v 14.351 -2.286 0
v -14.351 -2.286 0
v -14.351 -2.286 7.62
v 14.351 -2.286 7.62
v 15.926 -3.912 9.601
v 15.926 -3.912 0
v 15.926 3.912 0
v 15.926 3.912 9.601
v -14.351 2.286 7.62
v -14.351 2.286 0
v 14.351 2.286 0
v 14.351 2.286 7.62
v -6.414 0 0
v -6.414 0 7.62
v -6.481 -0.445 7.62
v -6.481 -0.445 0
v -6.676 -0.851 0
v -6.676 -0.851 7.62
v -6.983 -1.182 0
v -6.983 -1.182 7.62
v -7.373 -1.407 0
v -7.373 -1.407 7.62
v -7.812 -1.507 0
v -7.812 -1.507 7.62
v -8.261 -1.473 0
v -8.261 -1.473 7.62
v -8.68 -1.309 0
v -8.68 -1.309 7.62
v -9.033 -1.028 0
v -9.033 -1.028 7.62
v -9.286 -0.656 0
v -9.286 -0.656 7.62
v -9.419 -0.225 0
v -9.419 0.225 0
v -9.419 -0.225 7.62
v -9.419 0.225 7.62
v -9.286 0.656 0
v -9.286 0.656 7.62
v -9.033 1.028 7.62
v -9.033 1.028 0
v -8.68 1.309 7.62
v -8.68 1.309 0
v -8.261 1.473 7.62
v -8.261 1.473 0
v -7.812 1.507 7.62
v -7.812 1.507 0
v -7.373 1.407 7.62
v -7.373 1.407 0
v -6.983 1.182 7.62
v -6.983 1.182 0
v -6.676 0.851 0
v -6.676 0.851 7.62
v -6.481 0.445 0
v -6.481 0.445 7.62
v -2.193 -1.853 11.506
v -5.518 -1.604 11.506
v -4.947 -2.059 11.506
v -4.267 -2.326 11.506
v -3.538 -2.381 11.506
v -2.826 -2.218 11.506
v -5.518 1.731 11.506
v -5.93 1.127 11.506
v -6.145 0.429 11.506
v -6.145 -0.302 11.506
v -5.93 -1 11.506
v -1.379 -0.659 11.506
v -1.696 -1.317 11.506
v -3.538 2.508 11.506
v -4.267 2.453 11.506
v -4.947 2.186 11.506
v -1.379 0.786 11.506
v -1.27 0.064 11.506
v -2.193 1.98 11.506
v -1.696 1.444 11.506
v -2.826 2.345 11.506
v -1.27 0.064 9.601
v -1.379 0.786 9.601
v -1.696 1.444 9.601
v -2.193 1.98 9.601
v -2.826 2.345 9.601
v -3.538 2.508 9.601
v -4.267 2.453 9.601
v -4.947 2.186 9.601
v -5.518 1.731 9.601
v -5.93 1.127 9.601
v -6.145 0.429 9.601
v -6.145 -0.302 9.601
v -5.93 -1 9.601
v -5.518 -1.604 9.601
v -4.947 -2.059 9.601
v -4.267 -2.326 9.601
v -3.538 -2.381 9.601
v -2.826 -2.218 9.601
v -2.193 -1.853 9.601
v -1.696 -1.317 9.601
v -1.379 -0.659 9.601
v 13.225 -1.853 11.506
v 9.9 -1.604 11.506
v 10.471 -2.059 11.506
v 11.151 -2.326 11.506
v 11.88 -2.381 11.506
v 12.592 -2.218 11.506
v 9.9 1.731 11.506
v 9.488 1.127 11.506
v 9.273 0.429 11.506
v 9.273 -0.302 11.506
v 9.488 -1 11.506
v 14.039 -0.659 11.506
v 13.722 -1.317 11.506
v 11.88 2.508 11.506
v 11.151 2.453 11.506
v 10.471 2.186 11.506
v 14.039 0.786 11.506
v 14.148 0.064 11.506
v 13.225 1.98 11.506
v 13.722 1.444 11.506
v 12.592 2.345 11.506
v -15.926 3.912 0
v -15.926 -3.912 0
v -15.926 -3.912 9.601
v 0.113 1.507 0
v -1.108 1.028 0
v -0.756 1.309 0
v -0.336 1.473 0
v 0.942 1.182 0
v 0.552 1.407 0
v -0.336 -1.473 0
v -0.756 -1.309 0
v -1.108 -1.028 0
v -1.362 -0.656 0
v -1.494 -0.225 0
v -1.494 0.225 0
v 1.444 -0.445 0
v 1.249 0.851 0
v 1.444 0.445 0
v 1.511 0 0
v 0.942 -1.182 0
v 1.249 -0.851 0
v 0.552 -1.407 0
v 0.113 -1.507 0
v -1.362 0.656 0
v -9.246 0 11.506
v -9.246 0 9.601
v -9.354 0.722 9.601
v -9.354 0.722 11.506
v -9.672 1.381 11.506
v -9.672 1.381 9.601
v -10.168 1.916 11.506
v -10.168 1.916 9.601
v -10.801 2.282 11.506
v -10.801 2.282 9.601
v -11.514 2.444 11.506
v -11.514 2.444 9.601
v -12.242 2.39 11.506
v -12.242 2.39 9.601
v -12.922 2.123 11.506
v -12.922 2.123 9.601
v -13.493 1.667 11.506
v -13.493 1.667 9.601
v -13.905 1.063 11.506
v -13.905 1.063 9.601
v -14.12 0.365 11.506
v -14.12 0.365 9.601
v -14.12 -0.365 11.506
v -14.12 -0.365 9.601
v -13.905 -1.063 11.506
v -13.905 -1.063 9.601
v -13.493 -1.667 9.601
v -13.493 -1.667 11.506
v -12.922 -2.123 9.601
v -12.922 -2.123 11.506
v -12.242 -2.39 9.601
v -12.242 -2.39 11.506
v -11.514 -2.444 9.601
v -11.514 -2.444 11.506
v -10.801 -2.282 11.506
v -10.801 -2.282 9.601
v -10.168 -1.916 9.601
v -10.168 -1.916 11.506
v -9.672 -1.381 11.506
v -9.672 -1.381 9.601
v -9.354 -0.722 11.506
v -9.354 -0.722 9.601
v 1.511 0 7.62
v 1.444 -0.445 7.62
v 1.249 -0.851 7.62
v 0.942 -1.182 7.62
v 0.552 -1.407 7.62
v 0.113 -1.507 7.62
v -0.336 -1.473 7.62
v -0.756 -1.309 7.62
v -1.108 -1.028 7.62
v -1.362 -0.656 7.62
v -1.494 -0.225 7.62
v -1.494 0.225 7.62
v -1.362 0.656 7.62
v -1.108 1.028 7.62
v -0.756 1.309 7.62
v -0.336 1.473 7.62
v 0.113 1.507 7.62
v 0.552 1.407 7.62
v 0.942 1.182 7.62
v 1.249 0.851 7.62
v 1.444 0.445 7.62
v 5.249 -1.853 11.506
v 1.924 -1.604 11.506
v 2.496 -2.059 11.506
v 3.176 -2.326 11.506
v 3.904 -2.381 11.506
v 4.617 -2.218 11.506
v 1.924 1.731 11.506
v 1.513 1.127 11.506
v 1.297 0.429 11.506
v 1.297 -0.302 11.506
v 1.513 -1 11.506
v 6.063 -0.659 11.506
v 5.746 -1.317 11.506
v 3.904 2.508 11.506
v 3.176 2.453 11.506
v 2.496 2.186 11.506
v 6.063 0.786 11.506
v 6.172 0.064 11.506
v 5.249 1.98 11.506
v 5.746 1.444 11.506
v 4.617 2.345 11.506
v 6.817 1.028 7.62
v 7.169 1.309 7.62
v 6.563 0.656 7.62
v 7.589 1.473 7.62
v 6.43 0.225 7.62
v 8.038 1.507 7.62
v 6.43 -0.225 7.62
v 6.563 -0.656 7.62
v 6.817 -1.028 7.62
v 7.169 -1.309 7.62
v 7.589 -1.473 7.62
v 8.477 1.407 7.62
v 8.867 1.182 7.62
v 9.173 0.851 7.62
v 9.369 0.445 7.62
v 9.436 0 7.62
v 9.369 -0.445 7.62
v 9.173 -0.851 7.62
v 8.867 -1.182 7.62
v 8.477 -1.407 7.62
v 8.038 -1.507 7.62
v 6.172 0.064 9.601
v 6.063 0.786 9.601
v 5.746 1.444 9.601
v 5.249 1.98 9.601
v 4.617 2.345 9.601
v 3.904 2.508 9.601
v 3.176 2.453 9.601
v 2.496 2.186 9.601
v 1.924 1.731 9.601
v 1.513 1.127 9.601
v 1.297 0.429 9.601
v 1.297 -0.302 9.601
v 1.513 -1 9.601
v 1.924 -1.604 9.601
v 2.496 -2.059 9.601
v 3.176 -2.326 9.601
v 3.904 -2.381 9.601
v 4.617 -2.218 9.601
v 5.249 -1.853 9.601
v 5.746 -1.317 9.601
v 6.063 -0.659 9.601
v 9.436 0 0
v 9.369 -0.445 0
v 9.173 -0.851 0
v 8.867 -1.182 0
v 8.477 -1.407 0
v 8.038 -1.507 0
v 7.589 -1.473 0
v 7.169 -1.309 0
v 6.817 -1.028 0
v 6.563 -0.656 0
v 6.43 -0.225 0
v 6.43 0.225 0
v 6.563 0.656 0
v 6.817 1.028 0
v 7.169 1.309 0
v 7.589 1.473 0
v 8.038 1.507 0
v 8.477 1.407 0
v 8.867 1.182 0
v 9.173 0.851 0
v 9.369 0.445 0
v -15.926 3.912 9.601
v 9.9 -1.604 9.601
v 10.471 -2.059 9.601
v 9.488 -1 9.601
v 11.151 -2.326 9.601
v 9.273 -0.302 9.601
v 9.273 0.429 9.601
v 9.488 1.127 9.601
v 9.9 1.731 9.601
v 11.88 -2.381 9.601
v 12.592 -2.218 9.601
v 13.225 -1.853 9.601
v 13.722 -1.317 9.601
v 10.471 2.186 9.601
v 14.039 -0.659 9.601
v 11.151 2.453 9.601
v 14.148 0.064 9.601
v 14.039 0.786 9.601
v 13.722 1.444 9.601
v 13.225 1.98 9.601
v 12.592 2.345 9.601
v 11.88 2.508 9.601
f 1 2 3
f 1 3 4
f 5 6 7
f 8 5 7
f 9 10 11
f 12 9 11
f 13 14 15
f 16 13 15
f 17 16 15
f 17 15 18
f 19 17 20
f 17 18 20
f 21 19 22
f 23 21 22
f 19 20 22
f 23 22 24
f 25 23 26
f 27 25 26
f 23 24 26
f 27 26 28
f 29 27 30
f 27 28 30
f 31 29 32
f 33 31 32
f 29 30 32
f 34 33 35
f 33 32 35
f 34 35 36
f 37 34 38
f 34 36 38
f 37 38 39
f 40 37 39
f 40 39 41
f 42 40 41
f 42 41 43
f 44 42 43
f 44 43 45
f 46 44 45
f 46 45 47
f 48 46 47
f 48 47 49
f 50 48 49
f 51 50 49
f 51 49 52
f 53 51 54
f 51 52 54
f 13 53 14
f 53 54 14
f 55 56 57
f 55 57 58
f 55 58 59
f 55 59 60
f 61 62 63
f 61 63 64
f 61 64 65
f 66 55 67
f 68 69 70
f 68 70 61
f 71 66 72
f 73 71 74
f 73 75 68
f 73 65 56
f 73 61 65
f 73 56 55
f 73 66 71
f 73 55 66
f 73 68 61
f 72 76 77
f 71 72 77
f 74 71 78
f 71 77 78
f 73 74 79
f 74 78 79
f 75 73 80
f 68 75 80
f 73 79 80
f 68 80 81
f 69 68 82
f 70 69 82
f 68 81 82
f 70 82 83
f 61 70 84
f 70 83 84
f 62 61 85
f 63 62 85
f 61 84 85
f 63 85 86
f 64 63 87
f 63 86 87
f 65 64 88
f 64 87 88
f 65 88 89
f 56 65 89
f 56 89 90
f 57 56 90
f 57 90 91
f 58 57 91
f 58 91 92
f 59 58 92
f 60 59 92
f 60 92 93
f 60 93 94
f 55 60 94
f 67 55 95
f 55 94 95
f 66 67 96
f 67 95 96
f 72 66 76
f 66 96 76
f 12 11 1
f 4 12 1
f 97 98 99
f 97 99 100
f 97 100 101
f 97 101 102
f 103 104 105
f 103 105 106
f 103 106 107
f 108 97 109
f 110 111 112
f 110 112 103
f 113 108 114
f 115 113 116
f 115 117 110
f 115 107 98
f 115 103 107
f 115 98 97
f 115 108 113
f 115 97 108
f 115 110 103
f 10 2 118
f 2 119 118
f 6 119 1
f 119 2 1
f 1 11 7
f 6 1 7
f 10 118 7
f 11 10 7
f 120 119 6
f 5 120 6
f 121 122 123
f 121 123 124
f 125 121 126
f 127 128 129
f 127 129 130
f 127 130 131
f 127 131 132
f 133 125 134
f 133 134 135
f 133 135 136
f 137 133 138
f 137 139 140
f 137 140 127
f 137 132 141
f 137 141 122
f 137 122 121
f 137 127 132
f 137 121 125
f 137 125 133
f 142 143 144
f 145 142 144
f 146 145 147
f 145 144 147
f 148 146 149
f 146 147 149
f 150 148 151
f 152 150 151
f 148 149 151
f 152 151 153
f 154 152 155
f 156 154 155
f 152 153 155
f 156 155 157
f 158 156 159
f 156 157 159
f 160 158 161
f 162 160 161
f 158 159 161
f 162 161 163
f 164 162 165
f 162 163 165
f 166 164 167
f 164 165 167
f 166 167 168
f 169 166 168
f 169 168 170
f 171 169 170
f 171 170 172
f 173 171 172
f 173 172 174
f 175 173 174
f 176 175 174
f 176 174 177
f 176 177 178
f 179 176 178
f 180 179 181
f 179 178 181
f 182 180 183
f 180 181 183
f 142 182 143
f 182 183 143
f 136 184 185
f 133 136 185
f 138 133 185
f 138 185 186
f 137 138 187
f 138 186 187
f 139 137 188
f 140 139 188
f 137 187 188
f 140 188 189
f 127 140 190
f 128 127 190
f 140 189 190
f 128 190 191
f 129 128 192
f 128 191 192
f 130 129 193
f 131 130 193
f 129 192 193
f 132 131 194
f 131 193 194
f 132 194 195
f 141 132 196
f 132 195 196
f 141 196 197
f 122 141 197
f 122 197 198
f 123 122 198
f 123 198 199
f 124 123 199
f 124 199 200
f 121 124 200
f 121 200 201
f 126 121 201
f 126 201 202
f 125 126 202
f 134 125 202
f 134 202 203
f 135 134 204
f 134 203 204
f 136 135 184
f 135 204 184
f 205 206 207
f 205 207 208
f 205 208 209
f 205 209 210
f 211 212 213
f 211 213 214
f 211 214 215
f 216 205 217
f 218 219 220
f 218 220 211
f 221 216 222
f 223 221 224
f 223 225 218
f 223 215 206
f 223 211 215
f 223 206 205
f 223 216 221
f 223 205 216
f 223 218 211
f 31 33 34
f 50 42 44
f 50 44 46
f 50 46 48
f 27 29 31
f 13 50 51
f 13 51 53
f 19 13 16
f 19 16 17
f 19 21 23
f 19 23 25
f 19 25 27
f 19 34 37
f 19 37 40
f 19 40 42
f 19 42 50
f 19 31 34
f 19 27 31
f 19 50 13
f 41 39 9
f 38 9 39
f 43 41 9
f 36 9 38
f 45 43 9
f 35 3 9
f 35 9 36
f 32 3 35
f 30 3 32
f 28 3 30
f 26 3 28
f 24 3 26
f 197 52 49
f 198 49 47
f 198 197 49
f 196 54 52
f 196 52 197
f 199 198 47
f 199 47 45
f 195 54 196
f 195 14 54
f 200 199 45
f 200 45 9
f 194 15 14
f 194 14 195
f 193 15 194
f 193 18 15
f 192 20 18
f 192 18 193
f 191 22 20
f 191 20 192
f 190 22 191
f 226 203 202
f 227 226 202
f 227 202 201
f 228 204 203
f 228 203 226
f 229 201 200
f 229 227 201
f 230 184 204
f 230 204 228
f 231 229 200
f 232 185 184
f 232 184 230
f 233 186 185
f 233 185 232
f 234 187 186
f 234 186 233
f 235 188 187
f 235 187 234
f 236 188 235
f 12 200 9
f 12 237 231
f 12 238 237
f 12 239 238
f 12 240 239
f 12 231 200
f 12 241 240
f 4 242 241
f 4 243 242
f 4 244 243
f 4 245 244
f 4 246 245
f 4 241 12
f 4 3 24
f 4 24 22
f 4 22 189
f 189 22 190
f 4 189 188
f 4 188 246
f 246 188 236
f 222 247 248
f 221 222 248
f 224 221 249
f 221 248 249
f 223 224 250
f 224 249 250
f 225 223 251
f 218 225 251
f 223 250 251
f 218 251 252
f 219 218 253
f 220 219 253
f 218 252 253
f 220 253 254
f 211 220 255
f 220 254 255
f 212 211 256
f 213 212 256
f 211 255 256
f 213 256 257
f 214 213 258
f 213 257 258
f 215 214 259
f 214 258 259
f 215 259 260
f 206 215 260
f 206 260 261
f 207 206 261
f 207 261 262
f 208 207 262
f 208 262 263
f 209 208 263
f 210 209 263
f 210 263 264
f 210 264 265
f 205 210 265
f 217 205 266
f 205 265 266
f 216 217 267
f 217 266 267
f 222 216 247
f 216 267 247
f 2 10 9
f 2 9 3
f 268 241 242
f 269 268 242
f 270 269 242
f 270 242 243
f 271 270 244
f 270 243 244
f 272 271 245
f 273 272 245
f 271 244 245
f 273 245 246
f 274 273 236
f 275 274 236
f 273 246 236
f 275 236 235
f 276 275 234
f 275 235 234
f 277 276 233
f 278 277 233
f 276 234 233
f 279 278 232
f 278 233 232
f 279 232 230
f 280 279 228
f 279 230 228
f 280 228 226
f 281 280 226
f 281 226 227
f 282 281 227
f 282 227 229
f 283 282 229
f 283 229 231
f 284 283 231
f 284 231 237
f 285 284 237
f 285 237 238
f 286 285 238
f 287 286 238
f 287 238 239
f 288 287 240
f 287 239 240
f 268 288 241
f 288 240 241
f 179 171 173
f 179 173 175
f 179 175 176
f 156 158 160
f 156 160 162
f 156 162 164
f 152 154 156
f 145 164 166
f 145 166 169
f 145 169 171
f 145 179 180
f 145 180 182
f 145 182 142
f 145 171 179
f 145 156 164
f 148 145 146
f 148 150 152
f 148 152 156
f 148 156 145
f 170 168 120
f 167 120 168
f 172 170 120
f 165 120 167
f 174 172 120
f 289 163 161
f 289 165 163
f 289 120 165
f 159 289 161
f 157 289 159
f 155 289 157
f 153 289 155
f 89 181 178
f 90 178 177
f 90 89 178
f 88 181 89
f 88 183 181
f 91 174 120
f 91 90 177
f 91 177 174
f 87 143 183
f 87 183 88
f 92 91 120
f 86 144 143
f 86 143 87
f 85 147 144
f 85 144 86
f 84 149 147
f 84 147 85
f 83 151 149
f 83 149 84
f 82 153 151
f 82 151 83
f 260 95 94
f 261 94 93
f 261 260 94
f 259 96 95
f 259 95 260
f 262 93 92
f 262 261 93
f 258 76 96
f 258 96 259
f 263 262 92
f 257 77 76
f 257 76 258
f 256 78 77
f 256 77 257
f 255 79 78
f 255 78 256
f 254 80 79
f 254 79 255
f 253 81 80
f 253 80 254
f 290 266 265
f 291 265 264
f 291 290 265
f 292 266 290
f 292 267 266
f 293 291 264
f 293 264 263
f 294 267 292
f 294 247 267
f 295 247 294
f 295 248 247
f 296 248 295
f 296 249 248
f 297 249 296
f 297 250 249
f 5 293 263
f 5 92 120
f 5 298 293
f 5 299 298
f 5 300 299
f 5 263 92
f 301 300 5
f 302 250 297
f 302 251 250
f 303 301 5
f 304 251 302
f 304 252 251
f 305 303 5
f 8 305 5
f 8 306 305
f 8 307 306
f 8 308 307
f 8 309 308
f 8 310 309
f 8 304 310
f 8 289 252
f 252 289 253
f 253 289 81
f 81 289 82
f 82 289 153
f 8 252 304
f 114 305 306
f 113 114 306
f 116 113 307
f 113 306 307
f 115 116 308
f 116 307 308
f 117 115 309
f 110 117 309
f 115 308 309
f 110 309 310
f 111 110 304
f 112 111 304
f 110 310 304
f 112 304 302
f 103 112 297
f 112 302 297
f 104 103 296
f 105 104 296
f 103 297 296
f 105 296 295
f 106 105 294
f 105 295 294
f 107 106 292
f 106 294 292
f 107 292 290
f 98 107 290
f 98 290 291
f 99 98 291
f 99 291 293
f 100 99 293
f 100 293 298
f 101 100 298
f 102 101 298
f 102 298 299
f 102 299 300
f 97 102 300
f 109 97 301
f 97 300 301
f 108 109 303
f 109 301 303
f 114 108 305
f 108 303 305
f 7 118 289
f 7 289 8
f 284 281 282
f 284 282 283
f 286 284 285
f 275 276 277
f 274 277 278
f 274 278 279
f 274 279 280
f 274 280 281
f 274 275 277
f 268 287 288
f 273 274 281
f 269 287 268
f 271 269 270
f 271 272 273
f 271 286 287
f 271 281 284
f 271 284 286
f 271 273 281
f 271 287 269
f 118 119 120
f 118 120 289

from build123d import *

# Parameters (mm, degrees)
F0_W      = 31.8516
F0_H      = 7.8232
F1_DEPTH  = 9.6012
F2_R      = 2.4511
F3_DEPTH  = 1.905
F4_R      = 2.4511
F5_DEPTH  = 1.905
F6_R      = 2.4511
F7_DEPTH  = 1.905
F8_W      = 28.702
F8_H      = 4.572
F9_DEPTH  = 7.62
F10_R     = 1.5113
F11_DEPTH = 7.62


with BuildPart() as f1:
    # F0 (on Top) → F1 (new body)
    with BuildSketch(Plane.XY):
        Rectangle(F0_W, F0_H)
    extrude(amount=F1_DEPTH)

    # F2 (on face) → F3 (join)
    with BuildSketch(Plane.XY.offset(9.6012)):
        with Locations((-11.6967, 0)):
            Circle(F2_R)
    extrude(amount=F3_DEPTH)

    # F4 (on face) → F5 (join)
    with BuildSketch(Plane.XY.offset(9.6012)):
        with Locations((11.6967, 0.0635)):
            Circle(F4_R)
    extrude(amount=F5_DEPTH)

    # F6 (on face) → F7 (join)
    with BuildSketch(Plane.XY.offset(9.6012)):
        with Locations((-3.721353, 0.0635)):
            Circle(F6_R)
        with Locations((3.7211, 0.0635)):
            Circle(F6_R)
    extrude(amount=F7_DEPTH)

    # F8 (on face) → F9 (cut)
    with BuildSketch(Plane(origin=(0, 0, 0), x_dir=(1, 0, 0), z_dir=(0, 0, -1))):
        Rectangle(F8_W, F8_H)
    extrude(amount=-F9_DEPTH, mode=Mode.SUBTRACT)

    # F10 (on face) → F11 (join)
    with BuildSketch(Plane(origin=(0, 0, 7.62), x_dir=(1, 0, 0), z_dir=(0, 0, -1))):
        Circle(F10_R)
        with Locations((-7.9248, 0)):
            Circle(F10_R)
        with Locations((7.9248, 0)):
            Circle(F10_R)
    extrude(amount=F11_DEPTH)


solid = f1.part
